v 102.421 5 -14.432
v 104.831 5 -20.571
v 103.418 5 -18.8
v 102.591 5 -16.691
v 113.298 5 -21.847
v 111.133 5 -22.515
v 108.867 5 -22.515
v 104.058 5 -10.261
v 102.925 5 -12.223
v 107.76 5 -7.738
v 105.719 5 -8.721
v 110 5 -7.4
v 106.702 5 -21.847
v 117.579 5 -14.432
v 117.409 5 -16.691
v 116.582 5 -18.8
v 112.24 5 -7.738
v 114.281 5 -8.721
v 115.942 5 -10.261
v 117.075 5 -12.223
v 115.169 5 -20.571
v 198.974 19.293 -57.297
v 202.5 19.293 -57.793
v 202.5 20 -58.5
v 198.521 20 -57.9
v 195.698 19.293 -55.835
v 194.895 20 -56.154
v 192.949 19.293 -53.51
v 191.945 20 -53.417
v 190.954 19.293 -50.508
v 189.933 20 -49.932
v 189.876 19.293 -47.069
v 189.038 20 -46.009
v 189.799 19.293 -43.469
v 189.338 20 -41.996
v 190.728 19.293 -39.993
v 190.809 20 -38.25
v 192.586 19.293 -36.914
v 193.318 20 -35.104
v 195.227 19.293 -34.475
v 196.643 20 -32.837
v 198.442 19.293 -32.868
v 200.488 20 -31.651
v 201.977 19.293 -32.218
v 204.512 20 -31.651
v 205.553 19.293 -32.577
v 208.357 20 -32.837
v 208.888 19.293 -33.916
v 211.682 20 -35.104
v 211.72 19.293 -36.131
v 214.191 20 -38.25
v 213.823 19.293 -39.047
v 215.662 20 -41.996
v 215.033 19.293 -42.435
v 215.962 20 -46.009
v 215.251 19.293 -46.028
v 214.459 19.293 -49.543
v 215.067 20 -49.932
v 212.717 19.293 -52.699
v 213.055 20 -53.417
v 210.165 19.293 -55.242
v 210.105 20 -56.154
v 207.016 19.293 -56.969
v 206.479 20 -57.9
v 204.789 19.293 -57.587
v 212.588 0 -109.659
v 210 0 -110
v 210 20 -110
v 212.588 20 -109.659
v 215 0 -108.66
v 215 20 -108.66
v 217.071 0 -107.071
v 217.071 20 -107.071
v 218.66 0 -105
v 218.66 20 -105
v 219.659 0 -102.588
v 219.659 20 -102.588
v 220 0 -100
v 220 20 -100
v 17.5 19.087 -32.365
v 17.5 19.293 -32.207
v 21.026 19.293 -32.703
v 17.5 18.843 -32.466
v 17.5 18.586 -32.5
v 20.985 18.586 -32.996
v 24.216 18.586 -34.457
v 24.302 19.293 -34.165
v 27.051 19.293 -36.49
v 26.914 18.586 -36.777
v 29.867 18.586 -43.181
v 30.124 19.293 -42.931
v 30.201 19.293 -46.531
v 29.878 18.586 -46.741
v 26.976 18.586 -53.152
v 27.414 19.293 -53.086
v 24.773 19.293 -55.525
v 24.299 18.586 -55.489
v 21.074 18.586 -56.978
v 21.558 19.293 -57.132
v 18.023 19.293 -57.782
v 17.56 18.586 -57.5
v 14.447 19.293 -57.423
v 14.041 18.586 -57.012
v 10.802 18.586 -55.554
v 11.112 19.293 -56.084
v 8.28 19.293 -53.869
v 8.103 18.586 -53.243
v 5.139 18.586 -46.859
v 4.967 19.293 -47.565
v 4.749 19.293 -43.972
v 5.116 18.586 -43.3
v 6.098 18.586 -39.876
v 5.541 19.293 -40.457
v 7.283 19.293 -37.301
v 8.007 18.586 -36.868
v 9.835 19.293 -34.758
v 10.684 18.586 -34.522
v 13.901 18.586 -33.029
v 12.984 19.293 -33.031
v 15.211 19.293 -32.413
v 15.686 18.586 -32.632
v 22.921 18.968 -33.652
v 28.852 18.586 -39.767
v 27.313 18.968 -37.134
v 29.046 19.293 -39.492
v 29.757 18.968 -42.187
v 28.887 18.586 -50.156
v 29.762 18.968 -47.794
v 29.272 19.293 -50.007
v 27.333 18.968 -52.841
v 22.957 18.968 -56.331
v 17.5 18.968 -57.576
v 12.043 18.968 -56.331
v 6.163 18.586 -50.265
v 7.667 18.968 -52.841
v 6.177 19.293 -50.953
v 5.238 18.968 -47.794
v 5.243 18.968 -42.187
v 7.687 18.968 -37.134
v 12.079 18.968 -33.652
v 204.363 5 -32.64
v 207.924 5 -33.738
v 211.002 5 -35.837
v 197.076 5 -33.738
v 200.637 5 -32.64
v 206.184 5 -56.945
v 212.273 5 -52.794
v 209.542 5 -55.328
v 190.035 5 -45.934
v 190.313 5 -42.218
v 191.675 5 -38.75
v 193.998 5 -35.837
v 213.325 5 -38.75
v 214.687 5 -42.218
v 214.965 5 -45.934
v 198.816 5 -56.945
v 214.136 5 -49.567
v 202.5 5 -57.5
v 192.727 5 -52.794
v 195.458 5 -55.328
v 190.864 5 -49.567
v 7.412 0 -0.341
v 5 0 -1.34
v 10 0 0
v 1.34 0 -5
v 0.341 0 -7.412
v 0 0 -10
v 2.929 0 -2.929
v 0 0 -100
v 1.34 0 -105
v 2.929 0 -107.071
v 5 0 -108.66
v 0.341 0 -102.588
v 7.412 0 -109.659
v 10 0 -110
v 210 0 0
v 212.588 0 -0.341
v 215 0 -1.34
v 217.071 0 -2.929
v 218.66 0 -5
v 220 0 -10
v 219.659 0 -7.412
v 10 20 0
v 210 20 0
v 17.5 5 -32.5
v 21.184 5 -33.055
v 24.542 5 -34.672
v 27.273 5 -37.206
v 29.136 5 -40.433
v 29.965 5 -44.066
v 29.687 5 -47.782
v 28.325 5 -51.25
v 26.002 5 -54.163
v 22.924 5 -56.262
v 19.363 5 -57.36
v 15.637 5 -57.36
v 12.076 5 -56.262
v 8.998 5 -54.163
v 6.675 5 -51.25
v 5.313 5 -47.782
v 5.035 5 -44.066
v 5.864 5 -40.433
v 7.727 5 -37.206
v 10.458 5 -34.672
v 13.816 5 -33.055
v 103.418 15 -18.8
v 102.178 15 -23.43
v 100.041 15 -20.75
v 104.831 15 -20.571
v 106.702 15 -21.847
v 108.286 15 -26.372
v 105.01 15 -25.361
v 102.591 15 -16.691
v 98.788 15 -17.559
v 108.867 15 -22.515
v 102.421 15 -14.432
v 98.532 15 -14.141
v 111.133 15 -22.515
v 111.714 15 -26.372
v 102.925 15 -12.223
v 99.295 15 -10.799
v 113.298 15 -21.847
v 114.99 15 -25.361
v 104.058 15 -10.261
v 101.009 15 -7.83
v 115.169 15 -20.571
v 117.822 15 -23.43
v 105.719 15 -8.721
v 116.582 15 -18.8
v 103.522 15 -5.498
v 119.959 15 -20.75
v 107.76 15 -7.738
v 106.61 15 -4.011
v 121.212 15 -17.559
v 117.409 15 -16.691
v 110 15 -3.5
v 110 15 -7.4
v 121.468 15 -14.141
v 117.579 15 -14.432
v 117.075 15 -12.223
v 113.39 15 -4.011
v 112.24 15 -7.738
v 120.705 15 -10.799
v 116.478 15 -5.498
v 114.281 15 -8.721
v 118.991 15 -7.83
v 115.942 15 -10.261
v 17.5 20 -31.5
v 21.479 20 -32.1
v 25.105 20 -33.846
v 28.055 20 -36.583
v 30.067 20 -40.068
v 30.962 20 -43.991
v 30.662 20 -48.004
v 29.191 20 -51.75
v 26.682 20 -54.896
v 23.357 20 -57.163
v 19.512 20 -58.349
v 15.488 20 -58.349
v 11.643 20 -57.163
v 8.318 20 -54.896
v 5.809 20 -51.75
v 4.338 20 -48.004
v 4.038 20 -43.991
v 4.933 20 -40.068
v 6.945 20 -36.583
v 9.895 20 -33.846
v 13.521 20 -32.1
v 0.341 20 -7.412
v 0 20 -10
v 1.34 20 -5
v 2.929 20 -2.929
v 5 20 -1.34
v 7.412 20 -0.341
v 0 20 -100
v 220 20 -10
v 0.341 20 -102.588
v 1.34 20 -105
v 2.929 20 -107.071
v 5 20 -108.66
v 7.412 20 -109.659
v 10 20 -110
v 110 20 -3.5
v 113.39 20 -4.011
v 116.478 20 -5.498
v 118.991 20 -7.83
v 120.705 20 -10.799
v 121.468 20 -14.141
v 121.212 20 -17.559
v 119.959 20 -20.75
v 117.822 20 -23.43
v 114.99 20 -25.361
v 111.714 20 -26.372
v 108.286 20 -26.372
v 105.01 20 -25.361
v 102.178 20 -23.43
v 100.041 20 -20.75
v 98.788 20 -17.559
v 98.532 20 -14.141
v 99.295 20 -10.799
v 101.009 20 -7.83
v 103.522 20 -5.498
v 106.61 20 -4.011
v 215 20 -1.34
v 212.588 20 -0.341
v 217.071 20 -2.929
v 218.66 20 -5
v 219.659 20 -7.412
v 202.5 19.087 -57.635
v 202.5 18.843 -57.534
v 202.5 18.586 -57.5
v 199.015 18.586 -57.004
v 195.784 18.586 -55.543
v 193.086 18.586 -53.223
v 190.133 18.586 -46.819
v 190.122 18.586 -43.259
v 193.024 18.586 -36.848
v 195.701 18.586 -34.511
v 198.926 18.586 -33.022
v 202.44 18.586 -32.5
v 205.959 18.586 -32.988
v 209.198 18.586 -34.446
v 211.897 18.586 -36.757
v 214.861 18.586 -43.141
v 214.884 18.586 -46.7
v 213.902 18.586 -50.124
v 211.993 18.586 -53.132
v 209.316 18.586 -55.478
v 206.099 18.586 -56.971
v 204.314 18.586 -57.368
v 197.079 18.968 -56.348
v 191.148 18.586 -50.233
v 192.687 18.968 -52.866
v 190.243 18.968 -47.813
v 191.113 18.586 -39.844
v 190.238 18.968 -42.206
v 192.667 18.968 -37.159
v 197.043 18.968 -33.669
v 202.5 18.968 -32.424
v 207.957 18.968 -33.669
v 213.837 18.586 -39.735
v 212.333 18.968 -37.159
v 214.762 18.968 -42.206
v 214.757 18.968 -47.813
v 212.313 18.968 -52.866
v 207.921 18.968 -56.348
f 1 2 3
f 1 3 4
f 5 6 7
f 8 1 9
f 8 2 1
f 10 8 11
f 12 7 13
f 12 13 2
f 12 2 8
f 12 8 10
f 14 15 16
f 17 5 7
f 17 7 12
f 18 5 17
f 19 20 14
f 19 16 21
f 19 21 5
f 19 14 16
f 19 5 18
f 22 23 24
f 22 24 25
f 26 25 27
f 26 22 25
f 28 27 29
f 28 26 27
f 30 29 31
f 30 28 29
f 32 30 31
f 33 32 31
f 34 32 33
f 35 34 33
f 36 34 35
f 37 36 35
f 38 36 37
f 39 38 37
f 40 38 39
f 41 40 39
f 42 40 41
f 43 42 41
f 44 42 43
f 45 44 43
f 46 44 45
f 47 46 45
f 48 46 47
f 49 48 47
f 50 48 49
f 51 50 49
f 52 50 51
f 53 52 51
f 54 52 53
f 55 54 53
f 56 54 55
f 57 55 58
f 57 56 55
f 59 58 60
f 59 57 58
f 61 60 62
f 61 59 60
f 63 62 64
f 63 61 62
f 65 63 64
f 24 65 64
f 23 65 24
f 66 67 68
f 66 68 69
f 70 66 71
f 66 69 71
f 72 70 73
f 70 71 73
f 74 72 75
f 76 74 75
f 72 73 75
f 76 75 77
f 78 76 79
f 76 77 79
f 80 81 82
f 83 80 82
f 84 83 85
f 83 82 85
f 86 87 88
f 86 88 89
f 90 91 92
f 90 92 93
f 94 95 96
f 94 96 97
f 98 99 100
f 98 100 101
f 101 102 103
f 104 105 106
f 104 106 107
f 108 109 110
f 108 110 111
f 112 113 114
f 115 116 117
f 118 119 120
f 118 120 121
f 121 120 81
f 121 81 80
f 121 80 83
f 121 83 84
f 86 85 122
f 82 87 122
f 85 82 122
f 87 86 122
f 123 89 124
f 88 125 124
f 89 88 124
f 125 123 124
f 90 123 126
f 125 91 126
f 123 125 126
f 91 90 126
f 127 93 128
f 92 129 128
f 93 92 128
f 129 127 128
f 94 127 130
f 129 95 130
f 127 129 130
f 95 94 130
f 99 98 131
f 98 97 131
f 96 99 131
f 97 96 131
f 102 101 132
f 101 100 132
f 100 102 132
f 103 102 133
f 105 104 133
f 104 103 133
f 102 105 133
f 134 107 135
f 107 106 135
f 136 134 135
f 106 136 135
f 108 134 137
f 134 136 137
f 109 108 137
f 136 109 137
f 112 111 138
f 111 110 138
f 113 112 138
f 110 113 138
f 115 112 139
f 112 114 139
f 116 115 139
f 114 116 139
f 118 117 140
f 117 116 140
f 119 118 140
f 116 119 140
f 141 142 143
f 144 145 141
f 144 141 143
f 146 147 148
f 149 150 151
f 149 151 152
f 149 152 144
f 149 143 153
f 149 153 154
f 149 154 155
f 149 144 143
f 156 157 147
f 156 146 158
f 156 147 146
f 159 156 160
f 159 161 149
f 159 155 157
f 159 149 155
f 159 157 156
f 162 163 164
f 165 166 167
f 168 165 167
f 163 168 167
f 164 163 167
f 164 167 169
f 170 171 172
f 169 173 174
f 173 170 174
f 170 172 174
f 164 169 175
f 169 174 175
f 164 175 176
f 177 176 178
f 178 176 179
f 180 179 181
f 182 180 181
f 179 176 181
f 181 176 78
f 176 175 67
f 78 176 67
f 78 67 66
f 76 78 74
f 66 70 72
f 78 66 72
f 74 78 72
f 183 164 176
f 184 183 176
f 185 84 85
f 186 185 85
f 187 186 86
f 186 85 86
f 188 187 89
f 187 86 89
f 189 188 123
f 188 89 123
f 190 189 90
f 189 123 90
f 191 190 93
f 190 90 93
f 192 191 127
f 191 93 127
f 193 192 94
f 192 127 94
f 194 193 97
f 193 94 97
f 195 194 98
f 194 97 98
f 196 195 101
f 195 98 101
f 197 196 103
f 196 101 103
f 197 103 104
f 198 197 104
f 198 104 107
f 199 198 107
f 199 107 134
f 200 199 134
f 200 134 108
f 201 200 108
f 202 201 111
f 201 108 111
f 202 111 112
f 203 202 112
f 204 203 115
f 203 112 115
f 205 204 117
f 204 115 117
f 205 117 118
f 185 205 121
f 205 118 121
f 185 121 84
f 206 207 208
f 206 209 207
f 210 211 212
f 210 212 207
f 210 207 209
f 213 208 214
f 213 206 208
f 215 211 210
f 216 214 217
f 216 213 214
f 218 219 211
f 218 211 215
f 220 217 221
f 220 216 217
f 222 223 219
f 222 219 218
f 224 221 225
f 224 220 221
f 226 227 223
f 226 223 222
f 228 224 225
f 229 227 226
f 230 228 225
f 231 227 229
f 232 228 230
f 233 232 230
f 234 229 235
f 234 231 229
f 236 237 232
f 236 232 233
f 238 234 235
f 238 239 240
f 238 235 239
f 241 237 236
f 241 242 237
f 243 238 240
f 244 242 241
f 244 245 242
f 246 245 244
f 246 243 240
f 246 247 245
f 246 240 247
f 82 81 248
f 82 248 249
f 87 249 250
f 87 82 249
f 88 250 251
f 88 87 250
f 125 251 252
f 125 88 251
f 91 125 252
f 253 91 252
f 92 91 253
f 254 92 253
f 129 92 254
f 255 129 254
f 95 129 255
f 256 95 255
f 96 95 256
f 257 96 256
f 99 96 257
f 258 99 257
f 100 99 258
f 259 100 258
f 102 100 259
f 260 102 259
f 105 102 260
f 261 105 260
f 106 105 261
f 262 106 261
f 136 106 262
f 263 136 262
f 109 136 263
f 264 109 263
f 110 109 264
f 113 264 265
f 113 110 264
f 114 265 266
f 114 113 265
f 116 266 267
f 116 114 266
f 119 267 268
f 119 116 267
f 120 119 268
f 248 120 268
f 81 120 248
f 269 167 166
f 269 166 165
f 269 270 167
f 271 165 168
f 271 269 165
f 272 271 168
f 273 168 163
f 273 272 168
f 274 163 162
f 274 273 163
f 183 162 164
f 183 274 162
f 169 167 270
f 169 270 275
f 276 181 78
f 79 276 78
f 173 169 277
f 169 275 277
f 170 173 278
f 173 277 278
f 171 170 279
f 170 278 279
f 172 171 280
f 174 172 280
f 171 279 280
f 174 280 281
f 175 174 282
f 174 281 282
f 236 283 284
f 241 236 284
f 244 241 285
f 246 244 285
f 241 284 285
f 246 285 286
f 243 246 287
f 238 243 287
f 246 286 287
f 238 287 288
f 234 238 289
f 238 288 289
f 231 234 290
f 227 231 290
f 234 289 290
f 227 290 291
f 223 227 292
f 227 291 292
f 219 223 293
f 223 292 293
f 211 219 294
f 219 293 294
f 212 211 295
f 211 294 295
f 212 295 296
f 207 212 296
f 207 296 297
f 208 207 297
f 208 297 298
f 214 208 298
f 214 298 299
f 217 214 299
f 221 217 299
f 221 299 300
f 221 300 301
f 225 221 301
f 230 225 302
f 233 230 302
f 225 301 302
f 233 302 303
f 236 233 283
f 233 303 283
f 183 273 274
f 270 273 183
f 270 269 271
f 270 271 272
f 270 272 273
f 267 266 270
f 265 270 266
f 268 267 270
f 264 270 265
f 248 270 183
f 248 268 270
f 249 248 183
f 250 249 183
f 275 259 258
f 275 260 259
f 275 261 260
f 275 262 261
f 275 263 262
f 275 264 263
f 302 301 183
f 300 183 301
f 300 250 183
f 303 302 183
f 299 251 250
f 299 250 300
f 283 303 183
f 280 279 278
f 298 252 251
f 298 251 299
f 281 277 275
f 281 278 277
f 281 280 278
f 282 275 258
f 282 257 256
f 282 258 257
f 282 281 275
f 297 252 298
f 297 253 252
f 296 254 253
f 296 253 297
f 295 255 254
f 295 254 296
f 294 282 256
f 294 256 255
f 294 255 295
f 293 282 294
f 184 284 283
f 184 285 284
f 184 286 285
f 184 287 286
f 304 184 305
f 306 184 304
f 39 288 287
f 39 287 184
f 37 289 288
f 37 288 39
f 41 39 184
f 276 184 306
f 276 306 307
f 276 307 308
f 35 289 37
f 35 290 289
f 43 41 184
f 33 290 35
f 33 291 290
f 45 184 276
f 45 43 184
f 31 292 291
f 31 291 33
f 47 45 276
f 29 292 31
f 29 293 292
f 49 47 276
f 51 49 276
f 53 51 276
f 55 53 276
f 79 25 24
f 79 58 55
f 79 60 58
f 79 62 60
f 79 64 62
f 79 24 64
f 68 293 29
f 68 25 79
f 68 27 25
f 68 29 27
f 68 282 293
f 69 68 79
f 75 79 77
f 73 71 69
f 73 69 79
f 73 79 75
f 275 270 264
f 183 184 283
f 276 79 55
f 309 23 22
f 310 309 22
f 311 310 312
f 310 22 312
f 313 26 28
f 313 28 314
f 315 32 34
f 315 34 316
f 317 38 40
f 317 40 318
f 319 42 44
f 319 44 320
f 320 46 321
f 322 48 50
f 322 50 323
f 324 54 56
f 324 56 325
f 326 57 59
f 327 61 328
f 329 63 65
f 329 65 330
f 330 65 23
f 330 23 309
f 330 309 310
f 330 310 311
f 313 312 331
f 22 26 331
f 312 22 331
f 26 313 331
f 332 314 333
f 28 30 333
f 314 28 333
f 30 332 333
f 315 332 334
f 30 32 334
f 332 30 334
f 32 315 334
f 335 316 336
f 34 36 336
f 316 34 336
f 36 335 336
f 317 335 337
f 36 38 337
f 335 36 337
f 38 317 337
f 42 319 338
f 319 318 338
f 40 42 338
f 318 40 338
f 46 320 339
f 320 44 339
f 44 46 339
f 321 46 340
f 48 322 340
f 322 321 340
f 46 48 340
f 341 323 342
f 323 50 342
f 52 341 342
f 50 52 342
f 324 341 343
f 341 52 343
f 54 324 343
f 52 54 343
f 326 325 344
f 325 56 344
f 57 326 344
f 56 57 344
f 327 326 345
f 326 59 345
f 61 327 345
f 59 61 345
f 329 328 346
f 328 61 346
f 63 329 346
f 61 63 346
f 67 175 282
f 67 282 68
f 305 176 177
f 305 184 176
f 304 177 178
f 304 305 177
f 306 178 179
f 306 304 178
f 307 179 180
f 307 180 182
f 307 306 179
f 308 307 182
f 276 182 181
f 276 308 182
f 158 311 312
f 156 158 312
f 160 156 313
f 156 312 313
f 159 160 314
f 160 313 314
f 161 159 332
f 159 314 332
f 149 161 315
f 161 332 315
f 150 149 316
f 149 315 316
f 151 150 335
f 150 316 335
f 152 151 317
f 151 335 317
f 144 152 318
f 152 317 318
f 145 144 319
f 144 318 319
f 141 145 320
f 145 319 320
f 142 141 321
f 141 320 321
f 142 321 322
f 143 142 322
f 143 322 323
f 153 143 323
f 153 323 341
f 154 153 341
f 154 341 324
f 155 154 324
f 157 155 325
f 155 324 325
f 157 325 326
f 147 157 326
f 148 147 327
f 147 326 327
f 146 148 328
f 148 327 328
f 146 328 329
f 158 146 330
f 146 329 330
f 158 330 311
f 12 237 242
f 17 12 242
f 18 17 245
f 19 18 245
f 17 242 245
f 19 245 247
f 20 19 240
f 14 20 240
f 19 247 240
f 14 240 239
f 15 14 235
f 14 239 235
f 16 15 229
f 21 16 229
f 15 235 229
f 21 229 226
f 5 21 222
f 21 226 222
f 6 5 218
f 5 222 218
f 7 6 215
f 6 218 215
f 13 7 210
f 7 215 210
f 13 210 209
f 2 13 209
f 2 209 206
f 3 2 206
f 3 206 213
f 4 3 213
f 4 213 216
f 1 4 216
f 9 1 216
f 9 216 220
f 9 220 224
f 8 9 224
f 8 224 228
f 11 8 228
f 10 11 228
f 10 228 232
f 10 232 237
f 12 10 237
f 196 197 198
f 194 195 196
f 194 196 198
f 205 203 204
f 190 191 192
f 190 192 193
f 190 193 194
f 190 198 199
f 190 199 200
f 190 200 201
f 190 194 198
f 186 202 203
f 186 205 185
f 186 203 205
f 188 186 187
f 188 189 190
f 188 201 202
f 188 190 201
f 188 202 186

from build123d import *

# Parameters (mm, degrees)
SKETCH1_W           = 220
SKETCH1_H           = 110
BOSS_EXTRUDE1_DEPTH = 20
SKETCH2_R           = 12.5
SKETCH2_R_2         = 7.6
CUT_EXTRUDE1_DEPTH  = 15
CHAMFER1_SIZE       = 1
FILLET1_R           = 1
SKETCH4_R           = 11.5
CUT_EXTRUDE2_DEPTH  = 5
FILLET2_R           = 10


with BuildPart() as part:
    # Sketch1 → Boss-Extrude1 (new body)
    with BuildSketch(Plane(origin=(0, 0, 0), x_dir=(1, 0, 0), z_dir=(0, 1, 0))):
        with Locations((110, 55)):
            Rectangle(SKETCH1_W, SKETCH1_H)
    extrude(amount=BOSS_EXTRUDE1_DEPTH)

    # Sketch2 → Cut-Extrude1 (cut)
    with BuildSketch(Plane(origin=(0, 20, 0), x_dir=(1, 0, 0), z_dir=(0, 1, 0))):
        with Locations(Location((17.5, 45, 0), (0, 0, 270))):
            Circle(SKETCH2_R)
        with Locations(Location((202.5, 45, 0), (0, 0, 90))):
            Circle(SKETCH2_R)
        with Locations(Location((110, 15, 0), (0, 0, 270))):
            Circle(SKETCH2_R_2)
    extrude(amount=-CUT_EXTRUDE1_DEPTH, mode=Mode.SUBTRACT)

    # Chamfer1
    chamfer1_edges = [part.edges().sort_by_distance(p)[0] for p in [
        (17.5, 20, -57.5),
        (202.5, 20, -32.5),
    ]]
    chamfer(chamfer1_edges, length=CHAMFER1_SIZE)

    # Fillet1
    fillet1_edges = [part.edges().sort_by_distance(p)[0] for p in [
        (202.5, 19, -32.5),
        (17.5, 19, -57.5),
    ]]
    fillet(fillet1_edges, radius=FILLET1_R)

    # Sketch4 → Cut-Extrude2 (cut)
    with BuildSketch(Plane(origin=(0, 20, 0), x_dir=(1, 0, 0), z_dir=(0, 1, 0))):
        with Locations(Location((110, 15, 0), (0, 0, 270))):
            Circle(SKETCH4_R)
    extrude(amount=-CUT_EXTRUDE2_DEPTH, mode=Mode.SUBTRACT)

    # Fillet2
    fillet2_edges = [part.edges().sort_by_distance(p)[0] for p in [
        (0, 10, -110),
        (220, 10, -110),
        (220, 10, 0),
        (0, 10, 0),
    ]]
    fillet(fillet2_edges, radius=FILLET2_R)


solid = part.part
